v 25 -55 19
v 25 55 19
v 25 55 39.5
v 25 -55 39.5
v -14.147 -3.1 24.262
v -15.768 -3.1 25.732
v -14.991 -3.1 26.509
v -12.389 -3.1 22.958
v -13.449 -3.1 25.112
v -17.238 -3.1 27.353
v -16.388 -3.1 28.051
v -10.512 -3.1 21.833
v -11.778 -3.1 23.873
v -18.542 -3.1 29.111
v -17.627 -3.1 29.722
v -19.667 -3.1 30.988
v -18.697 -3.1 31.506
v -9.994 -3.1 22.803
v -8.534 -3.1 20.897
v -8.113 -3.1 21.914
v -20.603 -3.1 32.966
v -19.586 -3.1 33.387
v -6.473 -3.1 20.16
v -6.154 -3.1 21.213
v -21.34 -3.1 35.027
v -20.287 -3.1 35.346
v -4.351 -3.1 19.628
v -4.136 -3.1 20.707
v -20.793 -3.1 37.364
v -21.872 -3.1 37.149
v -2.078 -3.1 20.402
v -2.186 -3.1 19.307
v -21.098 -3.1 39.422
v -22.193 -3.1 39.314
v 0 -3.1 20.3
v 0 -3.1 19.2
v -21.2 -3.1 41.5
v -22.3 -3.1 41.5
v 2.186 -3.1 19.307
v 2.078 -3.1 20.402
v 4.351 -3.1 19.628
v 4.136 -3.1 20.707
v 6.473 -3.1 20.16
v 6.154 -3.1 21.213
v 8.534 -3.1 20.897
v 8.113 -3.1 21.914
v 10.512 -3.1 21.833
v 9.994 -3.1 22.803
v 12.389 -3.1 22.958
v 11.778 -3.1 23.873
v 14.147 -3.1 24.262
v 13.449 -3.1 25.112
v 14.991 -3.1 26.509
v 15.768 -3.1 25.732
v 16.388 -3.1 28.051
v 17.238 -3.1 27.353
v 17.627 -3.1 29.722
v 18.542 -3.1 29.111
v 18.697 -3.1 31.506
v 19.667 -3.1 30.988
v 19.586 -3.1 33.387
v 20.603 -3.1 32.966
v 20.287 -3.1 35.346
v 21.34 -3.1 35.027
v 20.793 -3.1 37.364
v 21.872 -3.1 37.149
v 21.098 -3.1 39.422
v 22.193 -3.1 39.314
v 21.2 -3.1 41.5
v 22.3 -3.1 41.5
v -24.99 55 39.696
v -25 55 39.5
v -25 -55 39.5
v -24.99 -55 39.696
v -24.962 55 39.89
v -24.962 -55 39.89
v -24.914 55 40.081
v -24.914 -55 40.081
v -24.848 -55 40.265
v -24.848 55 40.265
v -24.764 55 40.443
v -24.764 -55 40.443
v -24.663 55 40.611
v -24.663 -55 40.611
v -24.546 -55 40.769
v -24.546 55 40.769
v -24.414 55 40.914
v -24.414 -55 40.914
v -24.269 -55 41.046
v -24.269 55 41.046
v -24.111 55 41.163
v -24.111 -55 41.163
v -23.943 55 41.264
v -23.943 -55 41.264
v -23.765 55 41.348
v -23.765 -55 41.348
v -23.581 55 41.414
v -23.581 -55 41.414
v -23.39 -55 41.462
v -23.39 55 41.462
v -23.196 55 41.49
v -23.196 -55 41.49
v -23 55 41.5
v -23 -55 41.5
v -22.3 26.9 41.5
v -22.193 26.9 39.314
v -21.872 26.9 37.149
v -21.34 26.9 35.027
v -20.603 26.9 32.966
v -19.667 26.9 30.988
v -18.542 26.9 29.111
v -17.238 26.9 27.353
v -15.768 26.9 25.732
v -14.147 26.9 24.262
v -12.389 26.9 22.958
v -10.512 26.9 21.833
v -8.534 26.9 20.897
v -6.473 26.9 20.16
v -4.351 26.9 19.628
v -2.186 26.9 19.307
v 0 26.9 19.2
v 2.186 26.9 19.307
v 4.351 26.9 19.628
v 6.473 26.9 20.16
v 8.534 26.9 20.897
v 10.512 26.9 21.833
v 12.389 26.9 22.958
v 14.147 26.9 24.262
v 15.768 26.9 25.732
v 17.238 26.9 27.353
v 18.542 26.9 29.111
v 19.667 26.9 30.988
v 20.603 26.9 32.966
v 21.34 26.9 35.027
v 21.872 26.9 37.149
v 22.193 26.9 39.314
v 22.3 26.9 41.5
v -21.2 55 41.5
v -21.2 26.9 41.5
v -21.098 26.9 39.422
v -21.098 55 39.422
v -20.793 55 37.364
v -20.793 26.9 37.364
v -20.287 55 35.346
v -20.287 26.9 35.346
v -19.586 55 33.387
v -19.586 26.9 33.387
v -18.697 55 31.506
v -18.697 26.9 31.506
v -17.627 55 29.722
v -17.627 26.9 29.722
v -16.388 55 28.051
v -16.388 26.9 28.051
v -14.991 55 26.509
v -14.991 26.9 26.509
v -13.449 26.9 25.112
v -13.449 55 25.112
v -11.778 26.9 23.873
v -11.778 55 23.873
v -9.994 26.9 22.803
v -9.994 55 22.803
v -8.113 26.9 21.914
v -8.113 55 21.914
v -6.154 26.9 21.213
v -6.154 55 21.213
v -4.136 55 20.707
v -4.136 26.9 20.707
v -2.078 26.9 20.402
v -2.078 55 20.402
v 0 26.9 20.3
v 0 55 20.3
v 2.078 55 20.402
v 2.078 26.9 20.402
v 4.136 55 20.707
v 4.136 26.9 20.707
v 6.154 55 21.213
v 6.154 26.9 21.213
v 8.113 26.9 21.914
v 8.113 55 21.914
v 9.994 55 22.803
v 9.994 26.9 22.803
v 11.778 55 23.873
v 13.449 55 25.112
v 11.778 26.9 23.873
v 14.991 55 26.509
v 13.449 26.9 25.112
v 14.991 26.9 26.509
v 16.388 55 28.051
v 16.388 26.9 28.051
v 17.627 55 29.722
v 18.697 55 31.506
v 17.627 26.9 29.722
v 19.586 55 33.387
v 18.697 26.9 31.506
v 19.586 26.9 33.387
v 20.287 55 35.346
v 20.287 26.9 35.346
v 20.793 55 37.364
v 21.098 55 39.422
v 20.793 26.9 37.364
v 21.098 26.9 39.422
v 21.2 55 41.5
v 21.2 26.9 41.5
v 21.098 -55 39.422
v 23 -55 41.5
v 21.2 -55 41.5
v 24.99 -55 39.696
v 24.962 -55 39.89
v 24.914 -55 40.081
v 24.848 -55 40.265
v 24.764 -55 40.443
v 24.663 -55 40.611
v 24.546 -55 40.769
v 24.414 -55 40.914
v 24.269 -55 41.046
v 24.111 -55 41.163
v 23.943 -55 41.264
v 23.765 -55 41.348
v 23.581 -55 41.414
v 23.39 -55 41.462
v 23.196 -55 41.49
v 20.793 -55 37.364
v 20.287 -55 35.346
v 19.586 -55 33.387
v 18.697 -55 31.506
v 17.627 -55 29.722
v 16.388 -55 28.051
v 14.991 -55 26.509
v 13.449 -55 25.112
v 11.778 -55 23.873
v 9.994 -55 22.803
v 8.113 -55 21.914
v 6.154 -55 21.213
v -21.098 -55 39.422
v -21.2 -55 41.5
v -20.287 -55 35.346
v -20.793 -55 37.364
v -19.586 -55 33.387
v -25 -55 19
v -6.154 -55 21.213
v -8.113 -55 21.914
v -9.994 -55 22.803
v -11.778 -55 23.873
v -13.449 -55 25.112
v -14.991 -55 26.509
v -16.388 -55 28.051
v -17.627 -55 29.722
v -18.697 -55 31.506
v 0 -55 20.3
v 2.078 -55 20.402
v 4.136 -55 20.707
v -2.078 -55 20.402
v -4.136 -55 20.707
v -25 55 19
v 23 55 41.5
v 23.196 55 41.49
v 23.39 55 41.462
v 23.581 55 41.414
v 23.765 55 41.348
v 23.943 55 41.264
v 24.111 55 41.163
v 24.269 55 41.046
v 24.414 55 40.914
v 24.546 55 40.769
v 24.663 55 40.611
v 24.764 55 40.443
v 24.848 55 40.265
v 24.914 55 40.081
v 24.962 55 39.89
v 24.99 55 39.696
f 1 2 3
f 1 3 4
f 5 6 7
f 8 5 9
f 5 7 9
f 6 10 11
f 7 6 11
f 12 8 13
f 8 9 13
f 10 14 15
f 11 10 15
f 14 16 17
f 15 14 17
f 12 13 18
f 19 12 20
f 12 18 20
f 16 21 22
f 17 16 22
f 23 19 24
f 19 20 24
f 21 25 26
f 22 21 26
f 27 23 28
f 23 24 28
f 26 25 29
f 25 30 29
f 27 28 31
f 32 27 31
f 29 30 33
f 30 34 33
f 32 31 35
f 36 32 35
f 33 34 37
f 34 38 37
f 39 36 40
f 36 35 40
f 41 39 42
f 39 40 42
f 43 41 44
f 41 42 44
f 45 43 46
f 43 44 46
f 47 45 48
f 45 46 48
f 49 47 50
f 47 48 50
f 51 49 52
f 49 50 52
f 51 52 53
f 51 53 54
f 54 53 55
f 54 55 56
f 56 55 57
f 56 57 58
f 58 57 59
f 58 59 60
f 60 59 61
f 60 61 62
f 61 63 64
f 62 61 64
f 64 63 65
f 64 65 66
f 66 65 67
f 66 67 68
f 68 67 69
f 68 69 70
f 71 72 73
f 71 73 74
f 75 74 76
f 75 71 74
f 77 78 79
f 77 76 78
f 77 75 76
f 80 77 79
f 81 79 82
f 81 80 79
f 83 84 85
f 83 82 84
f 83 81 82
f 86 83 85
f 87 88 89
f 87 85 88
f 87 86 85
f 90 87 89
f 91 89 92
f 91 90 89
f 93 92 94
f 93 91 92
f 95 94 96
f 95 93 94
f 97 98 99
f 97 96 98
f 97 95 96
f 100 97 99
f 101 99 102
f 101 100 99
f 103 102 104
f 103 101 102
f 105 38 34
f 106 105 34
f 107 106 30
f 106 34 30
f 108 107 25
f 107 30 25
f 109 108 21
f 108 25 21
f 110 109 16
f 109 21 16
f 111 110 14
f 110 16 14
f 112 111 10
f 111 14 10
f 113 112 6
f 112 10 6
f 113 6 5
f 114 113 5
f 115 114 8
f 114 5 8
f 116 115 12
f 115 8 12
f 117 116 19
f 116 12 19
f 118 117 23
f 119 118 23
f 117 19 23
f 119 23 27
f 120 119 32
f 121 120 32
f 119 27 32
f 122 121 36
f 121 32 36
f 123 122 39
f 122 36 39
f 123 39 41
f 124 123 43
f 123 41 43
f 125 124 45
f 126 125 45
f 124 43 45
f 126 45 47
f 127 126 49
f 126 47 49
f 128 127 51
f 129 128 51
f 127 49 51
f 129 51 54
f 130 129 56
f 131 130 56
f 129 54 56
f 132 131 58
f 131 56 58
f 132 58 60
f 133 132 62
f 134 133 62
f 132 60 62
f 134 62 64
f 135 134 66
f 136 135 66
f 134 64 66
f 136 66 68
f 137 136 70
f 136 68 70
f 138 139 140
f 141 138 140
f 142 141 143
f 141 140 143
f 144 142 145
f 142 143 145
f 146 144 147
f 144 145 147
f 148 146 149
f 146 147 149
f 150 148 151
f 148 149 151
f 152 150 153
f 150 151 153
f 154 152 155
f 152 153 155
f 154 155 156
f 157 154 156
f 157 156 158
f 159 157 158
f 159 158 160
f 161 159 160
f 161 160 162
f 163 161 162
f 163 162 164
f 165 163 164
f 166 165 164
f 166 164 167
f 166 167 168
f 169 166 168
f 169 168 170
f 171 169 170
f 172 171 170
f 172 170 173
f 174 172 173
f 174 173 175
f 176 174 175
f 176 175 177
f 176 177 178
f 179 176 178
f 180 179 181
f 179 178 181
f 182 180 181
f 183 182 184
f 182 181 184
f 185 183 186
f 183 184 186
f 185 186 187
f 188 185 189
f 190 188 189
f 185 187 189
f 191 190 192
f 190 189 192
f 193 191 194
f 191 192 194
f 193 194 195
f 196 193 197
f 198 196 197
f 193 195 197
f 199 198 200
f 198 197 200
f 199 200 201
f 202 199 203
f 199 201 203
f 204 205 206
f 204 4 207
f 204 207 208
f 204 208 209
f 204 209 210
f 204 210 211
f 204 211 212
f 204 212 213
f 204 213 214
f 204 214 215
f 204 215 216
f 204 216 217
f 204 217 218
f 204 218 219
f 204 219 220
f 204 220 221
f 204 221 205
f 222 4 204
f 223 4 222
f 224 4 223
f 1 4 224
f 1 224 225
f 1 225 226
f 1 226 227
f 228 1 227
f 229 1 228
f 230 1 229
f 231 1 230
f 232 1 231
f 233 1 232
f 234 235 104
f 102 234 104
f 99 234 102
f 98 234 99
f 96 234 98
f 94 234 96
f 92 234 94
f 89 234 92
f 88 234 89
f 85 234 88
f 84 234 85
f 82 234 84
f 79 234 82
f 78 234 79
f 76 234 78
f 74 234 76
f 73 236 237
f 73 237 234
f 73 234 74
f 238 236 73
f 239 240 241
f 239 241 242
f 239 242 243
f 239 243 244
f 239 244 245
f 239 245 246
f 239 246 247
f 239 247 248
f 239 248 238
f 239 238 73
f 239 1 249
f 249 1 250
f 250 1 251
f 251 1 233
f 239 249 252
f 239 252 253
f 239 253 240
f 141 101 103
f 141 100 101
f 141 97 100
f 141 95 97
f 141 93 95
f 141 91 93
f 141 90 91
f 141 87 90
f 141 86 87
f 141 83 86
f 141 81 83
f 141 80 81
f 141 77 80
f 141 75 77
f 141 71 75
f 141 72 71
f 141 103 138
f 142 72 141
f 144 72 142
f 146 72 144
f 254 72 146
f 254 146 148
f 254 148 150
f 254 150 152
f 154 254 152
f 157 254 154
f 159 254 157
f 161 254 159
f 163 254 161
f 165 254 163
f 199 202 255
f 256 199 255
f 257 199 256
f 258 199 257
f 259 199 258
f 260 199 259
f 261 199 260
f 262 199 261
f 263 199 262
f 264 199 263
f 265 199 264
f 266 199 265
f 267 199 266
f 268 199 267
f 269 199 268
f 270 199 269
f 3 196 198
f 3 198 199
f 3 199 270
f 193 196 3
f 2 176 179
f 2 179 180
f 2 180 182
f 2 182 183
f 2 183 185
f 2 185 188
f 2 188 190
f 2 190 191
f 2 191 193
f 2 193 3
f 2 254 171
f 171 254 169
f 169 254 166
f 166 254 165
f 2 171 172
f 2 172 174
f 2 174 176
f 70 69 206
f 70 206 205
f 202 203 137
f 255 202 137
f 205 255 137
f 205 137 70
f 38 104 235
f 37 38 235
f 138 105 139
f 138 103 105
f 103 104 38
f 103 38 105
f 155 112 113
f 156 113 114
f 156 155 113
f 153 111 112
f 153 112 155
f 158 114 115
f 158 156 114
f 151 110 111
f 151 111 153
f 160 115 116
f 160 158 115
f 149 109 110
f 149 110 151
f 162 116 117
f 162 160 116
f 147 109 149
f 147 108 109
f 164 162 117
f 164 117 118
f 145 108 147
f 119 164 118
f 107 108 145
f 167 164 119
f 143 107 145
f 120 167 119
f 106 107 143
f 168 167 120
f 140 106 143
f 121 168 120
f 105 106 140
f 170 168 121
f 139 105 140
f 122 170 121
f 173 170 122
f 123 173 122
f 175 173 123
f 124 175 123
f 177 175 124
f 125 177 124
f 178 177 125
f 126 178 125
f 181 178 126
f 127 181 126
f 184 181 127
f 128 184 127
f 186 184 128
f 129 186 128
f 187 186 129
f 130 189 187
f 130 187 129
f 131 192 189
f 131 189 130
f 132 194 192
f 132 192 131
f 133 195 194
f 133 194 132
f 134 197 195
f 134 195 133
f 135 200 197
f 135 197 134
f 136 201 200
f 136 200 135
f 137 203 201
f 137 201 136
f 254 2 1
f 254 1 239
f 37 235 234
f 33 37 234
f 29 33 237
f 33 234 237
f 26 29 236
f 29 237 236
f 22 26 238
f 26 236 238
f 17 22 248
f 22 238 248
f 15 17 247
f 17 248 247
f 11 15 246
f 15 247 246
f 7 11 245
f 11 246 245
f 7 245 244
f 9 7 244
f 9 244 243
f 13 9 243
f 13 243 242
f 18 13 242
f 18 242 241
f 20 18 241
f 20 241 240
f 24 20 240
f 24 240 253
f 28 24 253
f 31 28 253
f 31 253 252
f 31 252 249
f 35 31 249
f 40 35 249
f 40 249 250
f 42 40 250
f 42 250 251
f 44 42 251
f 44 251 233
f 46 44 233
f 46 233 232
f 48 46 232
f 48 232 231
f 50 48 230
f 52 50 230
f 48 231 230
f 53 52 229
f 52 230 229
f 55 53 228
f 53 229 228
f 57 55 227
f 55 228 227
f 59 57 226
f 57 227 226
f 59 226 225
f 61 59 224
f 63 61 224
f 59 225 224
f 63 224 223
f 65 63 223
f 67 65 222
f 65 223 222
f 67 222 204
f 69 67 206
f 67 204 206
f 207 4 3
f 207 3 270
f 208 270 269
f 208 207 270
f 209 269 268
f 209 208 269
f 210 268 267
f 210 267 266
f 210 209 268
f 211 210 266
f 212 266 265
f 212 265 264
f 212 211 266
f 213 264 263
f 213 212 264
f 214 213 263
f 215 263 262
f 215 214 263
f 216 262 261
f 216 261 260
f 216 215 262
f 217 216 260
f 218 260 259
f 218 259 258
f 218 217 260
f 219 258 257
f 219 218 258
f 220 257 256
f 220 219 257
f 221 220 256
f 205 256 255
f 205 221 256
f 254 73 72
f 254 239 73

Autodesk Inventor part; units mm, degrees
ref_plane "YZ Plane" through (0, 0, 0) normal (1, 0, 0) x (0, 1, 0)
ref_plane "XZ Plane" through (0, 0, 0) normal (0, 1, 0) x (-1, 0, 0)
ref_plane "XY Plane" through (0, 0, 0) normal (0, 0, 1) x (1, 0, 0)
sketch "스케치1" plane through (0, 0, 0) normal (0, 0, 1) x (1, 0, 0)
  line L0 (-25, 55) -> (25, 55)
  line L1 (25, 55) -> (25, -55)
  line L2 (25, -55) -> (-25, -55)
  line L3 (-25, -55) -> (-25, 55)
  line L4 (-25, 55) -> (25, -55) construction
  line L5 (25, 55) -> (-25, -55) construction
  point P0 (0, 0)
  dimension "d0" = 50
  dimension "d1" = 110
extrude "돌출1" add sketch "스케치1" along normal blind 41.5
sketch "스케치2" plane through (-25, -55, 0) normal (0, -1, 0) x (1, 0, 0)
  line L0 (50, 0) -> (0, 0) projected
  line L1 (0, 0) -> (25, 0)
  line L2 (25, 0) -> (25, 41.5)
  line L3 (50, 41.5) -> (0, 41.5) projected
  circle A0 centre (25, 41.5) radius 21.2
  dimension "d4" = 42.4
extrude "돌출2" cut sketch "스케치2" against normal blind 51.9
sketch "스케치3" plane through (-25, -3.1, 0) normal (0, -1, 0) x (1, 0, 0)
  line L0 (0, 0) -> (25, 0)
  line L1 (0, 0) -> (50, 0) projected
  line L2 (25, 0) -> (25, 41.5)
  line L3 (50, 41.5) -> (0, 41.5) projected
  circle A0 centre (25, 41.5) radius 22.3
  dimension "d7" = 44.6
extrude "돌출3" cut sketch "스케치3" against normal blind 30
sketch "스케치4" plane through (-25, 26.9, 0) normal (0, -1, 0) x (1, 0, 0)
  line L0 (50, 0) -> (0, 0)
  line L1 (0, 0) -> (25, 0)
  line L2 (25, 0) -> (25, 41.5)
  line L3 (50, 41.5) -> (0, 41.5)
  circle A0 centre (25, 41.5) radius 21.2
  dimension "d10" = 42.4
extrude "돌출4" cut sketch "스케치4" against normal through all
fillet "모깎기1" radius 2 2 edges at (-25, 0, 41.5) (25, 0, 41.5)
sketch "스케치5" plane through (-25, 55, 0) normal (0, 1, 0) x (1, 0, 0)
  arc A0 (47.3, -41.5) -> (2.7, -41.5) centre (25, -41.5) ccw projected
  arc A1 (47.3, -41.5) -> (2.7, -41.5) centre (25, -41.5) ccw projected
  line L0 (0, 0) -> (0, -39.5) projected
  line L1 (50, 0) -> (50, -39.5) projected
  line L2 (0, 0) -> (50, 0)
  line L3 (50, 0) -> (50, -19)
  line L4 (50, -19) -> (0, -19)
  line L5 (0, -19) -> (0, 0)
  point P0 (25, 0)
  dimension "d15" = 19
extrude "돌출5" cut sketch "스케치5" against normal through all
properties part number "motor_support2" material "ABS 플라스틱"
